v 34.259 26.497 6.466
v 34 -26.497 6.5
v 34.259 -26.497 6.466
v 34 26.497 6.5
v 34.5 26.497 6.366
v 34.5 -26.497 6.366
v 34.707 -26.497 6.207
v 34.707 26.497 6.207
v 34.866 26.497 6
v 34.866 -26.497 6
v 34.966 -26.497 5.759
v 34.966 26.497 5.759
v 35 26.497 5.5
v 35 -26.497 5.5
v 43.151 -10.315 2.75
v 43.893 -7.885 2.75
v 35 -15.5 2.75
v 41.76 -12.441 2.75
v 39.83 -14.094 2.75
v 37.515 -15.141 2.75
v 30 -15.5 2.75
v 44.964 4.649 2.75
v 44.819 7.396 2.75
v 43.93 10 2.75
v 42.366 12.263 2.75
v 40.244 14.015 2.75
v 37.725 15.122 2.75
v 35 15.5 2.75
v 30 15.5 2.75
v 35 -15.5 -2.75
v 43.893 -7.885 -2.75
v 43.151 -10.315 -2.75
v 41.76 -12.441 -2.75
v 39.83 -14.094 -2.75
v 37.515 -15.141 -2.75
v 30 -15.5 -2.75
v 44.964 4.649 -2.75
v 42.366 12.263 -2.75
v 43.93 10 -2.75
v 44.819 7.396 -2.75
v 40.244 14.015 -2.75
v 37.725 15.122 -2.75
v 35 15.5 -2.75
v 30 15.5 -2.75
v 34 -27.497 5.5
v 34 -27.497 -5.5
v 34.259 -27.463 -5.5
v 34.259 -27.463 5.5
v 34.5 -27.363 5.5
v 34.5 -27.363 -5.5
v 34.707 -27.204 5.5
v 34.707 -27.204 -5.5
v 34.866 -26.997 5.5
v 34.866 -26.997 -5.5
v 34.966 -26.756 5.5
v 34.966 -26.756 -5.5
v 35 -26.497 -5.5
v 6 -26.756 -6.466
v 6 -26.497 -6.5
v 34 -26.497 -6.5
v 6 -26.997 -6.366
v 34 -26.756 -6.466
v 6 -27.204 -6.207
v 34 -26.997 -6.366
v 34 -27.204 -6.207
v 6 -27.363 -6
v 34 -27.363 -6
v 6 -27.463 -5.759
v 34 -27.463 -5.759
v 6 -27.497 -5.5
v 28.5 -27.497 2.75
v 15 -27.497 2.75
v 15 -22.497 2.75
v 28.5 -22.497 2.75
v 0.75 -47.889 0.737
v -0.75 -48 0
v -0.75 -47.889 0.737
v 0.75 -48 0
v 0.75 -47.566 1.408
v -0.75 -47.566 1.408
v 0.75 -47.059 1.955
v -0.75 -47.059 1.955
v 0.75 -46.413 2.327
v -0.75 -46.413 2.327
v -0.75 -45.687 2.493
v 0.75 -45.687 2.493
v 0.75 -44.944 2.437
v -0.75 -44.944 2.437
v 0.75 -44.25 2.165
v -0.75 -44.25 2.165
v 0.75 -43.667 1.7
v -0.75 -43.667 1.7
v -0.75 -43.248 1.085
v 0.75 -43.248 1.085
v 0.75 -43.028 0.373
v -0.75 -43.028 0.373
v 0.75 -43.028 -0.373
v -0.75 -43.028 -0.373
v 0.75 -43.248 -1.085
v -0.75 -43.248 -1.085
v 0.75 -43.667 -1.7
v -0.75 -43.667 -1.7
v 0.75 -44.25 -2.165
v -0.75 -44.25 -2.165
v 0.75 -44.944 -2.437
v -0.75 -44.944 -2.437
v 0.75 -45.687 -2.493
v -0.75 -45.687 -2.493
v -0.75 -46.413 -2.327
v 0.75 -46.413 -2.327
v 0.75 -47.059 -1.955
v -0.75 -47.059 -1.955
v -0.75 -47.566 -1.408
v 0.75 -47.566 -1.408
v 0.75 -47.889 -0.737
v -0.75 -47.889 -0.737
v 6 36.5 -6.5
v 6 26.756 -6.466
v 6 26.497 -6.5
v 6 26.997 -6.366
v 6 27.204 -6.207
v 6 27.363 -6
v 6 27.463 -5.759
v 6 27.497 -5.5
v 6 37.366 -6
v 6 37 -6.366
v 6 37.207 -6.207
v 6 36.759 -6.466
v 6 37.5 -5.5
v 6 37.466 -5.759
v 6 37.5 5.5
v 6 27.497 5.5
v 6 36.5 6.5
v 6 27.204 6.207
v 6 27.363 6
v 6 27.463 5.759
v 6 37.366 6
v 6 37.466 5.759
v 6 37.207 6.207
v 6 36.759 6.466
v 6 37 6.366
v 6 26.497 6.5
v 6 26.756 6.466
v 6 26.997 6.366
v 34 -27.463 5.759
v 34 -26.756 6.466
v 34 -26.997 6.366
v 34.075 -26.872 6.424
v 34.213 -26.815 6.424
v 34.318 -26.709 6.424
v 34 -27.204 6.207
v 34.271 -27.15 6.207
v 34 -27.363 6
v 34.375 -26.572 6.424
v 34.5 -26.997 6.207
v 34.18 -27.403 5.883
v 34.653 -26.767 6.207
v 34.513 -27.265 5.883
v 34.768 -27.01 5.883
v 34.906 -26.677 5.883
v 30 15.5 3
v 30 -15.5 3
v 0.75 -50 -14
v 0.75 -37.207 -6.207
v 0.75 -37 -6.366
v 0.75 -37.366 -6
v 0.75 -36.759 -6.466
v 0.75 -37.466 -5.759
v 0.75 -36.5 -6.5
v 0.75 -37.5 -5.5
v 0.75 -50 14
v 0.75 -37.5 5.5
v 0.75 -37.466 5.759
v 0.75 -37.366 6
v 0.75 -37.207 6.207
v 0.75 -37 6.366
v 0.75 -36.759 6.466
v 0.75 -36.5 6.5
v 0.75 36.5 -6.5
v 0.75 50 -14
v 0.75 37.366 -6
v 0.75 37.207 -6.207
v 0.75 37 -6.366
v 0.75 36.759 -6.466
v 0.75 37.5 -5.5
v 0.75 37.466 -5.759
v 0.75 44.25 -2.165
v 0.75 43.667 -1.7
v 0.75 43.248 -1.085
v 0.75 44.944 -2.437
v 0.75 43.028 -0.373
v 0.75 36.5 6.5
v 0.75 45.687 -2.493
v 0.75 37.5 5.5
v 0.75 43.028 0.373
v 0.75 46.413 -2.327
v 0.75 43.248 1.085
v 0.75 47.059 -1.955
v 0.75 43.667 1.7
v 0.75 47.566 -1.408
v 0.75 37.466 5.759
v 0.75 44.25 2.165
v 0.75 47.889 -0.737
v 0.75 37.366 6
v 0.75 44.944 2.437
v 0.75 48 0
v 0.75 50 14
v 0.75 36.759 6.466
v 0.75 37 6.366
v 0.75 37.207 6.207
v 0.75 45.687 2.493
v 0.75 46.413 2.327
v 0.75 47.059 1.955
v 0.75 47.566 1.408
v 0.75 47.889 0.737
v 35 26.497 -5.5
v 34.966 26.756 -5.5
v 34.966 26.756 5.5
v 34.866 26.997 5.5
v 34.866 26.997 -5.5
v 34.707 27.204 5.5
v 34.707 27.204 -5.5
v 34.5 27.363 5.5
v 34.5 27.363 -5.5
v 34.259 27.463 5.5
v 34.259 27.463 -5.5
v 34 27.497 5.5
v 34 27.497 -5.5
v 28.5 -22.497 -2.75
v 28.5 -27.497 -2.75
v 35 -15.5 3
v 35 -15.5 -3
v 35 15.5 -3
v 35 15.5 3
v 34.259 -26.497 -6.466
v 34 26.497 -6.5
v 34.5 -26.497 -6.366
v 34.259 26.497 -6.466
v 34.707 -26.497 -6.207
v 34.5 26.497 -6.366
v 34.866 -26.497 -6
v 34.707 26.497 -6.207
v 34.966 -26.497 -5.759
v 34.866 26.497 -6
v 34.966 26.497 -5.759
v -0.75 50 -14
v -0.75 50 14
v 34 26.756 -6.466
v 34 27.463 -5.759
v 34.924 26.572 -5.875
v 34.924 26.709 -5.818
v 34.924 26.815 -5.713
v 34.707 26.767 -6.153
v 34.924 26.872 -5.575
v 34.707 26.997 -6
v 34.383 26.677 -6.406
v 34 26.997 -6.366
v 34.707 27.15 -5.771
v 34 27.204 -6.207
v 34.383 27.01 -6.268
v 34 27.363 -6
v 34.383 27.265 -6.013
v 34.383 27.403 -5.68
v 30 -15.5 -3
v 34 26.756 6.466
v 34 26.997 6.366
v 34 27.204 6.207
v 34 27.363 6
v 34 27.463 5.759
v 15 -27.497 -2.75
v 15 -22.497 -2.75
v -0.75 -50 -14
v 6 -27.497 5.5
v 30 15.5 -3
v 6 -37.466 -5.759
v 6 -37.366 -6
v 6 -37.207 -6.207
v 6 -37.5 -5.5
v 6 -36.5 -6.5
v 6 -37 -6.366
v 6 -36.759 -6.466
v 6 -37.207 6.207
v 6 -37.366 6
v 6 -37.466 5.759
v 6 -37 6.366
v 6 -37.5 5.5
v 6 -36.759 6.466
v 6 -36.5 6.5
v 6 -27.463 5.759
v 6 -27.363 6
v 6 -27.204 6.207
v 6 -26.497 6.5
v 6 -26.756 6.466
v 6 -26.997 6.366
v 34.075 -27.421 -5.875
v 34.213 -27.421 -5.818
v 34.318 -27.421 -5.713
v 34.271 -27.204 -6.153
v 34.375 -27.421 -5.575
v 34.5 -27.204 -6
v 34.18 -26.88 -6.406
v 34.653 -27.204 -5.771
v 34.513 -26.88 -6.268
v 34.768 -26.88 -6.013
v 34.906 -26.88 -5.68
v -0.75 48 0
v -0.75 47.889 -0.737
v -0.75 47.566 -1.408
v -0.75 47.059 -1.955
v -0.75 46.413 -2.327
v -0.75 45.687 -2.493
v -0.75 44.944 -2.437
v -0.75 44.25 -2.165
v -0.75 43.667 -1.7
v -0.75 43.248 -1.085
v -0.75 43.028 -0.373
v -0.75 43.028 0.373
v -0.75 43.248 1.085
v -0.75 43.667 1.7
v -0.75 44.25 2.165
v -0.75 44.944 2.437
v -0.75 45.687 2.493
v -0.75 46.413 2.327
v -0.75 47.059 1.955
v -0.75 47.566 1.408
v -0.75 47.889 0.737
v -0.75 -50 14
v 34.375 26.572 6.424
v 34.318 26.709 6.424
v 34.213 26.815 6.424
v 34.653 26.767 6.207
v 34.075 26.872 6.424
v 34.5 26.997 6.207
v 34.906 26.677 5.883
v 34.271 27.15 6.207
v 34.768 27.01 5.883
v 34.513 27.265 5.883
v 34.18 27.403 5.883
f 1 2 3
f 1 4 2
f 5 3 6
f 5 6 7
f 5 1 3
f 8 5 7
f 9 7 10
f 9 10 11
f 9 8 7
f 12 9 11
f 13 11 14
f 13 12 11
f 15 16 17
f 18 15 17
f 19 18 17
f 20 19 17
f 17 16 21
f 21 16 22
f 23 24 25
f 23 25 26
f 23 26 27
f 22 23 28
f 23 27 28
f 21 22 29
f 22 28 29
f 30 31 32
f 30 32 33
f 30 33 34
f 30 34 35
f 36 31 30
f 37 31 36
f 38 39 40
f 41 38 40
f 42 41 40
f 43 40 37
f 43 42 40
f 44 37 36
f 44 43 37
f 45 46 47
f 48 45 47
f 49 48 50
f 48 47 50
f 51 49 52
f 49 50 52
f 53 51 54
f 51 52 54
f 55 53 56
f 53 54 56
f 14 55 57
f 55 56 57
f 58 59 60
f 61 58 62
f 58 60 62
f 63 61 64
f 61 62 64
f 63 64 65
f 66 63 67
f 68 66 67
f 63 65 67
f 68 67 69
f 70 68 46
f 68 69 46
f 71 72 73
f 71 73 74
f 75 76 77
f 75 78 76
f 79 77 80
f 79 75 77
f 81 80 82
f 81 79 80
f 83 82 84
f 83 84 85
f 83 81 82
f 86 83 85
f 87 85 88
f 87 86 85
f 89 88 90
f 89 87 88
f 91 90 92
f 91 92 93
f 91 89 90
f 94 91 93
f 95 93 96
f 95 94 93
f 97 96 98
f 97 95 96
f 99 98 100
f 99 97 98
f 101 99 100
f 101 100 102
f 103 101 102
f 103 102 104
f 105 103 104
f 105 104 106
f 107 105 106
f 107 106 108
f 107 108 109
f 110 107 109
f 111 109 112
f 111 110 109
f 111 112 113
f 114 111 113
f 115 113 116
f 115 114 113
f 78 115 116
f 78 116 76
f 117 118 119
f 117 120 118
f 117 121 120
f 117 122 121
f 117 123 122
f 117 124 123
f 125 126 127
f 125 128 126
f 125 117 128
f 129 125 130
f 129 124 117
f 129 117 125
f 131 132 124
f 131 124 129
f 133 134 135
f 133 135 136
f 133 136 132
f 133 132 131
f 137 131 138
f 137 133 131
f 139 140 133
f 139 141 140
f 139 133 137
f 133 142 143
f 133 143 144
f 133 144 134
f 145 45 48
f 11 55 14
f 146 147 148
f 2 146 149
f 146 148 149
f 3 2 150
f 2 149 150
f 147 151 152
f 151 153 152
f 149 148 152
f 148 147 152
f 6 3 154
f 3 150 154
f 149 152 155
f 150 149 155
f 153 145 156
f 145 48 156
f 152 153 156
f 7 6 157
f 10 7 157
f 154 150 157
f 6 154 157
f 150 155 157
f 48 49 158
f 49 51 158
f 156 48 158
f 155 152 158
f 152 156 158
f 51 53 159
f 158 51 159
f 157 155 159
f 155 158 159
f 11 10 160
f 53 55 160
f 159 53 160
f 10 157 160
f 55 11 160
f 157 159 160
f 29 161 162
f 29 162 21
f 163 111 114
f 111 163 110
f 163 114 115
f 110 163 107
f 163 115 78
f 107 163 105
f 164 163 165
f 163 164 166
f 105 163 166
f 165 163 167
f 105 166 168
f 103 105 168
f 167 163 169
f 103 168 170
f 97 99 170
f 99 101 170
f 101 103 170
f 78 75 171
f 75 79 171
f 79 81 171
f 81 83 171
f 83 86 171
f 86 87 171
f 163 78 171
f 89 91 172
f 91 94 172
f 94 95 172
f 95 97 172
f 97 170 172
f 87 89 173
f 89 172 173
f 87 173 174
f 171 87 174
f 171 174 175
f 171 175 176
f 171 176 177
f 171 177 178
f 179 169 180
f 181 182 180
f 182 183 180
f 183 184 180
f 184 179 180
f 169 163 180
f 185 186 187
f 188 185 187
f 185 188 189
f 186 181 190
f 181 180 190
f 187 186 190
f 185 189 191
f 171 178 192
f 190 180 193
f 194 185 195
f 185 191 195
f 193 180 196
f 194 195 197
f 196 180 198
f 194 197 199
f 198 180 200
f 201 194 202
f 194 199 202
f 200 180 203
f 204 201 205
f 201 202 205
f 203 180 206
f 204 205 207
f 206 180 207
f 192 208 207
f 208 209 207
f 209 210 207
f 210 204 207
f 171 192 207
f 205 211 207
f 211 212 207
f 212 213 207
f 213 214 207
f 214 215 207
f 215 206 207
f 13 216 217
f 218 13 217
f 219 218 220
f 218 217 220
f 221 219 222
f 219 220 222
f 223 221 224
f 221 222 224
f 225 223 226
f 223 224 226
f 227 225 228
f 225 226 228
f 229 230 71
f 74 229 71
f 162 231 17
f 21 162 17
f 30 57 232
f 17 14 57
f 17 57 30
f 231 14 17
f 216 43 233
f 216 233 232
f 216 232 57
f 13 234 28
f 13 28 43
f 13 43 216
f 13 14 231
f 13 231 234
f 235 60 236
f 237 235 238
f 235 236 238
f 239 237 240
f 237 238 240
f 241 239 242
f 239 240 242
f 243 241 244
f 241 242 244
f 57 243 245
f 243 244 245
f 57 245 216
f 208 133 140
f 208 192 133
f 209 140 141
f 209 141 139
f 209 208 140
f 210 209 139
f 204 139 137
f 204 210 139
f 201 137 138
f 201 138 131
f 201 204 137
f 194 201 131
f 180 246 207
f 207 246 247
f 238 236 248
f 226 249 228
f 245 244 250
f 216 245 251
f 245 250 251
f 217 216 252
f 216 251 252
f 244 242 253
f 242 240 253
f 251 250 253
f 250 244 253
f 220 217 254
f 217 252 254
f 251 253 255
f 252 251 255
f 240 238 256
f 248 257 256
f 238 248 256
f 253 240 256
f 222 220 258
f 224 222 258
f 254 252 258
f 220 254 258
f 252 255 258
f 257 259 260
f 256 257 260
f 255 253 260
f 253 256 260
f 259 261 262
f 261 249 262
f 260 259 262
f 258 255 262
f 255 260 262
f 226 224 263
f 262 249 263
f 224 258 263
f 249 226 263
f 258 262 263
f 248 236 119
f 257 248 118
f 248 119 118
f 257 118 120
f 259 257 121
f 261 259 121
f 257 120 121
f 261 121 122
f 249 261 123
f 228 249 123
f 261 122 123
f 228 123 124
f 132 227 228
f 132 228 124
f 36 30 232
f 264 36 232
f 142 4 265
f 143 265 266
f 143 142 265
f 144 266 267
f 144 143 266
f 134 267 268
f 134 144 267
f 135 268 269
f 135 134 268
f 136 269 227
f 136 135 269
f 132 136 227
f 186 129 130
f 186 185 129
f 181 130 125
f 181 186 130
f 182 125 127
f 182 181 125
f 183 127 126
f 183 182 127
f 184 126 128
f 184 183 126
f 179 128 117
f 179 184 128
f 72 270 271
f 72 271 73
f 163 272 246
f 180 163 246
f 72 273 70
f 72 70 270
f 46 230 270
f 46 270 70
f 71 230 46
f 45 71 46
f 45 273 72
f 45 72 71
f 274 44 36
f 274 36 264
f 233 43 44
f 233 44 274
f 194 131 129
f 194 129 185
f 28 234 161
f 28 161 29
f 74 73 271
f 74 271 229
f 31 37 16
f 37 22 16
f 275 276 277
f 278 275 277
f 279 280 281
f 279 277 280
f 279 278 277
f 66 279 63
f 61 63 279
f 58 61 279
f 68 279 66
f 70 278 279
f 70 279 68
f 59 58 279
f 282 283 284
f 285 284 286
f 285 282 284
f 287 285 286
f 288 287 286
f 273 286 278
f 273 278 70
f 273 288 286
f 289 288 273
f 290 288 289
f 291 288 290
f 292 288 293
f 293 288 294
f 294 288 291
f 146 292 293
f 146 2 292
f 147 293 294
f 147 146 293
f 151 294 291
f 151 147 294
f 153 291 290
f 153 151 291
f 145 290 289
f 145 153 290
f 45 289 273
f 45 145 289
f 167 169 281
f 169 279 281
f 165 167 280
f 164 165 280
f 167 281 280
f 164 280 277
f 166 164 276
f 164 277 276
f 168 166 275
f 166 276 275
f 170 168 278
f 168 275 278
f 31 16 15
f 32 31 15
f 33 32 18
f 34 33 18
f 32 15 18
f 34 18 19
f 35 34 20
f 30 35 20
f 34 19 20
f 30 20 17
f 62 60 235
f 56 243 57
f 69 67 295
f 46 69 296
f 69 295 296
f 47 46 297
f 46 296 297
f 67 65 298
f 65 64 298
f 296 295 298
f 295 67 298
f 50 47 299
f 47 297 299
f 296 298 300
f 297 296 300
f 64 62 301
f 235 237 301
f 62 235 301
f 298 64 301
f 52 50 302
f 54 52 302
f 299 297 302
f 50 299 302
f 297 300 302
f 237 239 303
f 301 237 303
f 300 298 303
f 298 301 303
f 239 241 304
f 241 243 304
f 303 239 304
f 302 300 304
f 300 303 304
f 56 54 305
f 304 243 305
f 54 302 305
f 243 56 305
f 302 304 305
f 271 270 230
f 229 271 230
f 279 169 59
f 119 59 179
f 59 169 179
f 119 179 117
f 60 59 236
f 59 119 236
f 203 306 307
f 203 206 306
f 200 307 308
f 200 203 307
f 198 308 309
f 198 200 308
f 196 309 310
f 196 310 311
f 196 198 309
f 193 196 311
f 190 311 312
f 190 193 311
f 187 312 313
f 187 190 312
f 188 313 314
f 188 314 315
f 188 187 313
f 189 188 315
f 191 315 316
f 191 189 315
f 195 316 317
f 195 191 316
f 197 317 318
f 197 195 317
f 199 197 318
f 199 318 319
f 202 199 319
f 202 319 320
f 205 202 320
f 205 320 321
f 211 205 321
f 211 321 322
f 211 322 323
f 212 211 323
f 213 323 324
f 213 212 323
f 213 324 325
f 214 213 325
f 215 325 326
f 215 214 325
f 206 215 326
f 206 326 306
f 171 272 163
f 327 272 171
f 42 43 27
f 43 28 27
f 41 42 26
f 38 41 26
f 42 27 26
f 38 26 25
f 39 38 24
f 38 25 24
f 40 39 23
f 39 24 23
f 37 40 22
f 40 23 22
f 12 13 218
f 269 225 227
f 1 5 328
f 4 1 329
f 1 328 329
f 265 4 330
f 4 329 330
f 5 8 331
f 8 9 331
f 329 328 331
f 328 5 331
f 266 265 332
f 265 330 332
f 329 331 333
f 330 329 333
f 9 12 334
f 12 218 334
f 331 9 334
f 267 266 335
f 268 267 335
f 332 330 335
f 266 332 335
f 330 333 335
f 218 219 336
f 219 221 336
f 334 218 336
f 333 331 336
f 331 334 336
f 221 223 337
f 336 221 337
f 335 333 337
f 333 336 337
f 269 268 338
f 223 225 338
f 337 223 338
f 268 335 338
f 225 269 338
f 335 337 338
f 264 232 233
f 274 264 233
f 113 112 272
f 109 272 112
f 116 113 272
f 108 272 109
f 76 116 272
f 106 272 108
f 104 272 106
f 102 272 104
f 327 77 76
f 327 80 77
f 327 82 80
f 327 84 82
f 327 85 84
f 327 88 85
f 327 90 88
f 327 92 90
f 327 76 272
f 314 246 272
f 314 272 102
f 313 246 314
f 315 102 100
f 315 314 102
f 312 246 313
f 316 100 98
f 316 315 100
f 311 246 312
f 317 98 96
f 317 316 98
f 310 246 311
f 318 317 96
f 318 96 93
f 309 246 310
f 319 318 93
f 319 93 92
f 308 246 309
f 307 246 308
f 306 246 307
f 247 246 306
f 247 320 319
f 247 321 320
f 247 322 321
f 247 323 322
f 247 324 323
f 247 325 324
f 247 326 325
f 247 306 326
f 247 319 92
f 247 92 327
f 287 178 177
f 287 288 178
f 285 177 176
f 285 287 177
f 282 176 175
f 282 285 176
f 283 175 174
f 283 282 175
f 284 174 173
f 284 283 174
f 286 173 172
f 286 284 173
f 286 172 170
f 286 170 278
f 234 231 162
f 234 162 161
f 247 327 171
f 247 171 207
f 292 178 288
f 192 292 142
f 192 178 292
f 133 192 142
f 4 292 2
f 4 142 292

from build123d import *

# Parameters (mm, degrees)
EXTRUDE_1_DEPTH     = 6.5
SKETCH_2_W          = 28
SKETCH_2_H          = 100
SKETCH_2_R          = 2.5
EXTRUDE_2_DEPTH     = 0.75
SKETCH_3_W          = 6
SKETCH_3_H          = 31
CUT_EXTRUDE_1_DEPTH = 5
SKETCH_4_W          = 13.5
SKETCH_4_H          = 5.5
CUT_EXTRUDE_2_DEPTH = 5
EXTRUDE_3_DEPTH     = 2.75
FILLET_1_R          = 1
FILLET_2_R          = 1


with BuildPart() as part:
    # 草图1 → 凸台-拉伸1 (new, symmetric)
    with BuildSketch(Plane.XY):
        Polygon((0, 1.01114255), (0, 0), (35, 0), (35, 27.496864511), (6, 27.496864511), (6, 37.5), (0, 37.5), align=None)
        Polygon((35, 0), (0, 0), (0, -1.01114255), (0, -37.5), (6, -37.5), (6, -27.496864511), (35, -27.496864511), align=None)
    extrude(amount=EXTRUDE_1_DEPTH, both=True)

    # 草图2 → 凸台-拉伸2 (add, symmetric)
    with BuildSketch(Plane.ZY):
        Rectangle(SKETCH_2_W, SKETCH_2_H)
        with Locations(Location((0, -45.5, 0), (0, 0, 270))):
            Circle(SKETCH_2_R, mode=Mode.SUBTRACT)
        with Locations(Location((0, 45.5, 0), (0, 0, 90))):
            Circle(SKETCH_2_R, mode=Mode.SUBTRACT)
    extrude(amount=EXTRUDE_2_DEPTH, both=True)

    # 草图3 → 切除-拉伸1 (cut)
    with BuildSketch(Plane(origin=(35, 0, 0), x_dir=(0, 0, -1), z_dir=(1, 0, 0))):
        Rectangle(SKETCH_3_W, SKETCH_3_H)
    extrude(amount=-CUT_EXTRUDE_1_DEPTH, mode=Mode.SUBTRACT)

    # 草图4 → 切除-拉伸2 (cut)
    with BuildSketch(Plane.XZ.offset(27.496864511)):
        with Locations((21.75, 0)):
            Rectangle(SKETCH_4_W, SKETCH_4_H)
    extrude(amount=-CUT_EXTRUDE_2_DEPTH, mode=Mode.SUBTRACT)

    # 草图5 → 凸台-拉伸3 (add, symmetric)
    with BuildSketch(Plane.XY):
        with BuildLine():
            Line((30, -15.5), (30, 15.5))
            Line((30, 15.5), (35, 15.5))
            ThreePointArc((35, 15.5), (42.36590029, 12.263395074), (44.963698746, 4.648702584))
            Line((44.963698746, 4.648702584), (43.892853324, -7.884615385))
            ThreePointArc((43.892853324, -7.884615385), (40.85399272, -13.335990728), (35, -15.5))
            Line((35, -15.5), (30, -15.5))
        make_face()
    extrude(amount=EXTRUDE_3_DEPTH, both=True)

    # 圆角1
    fillet_1_edges = [part.edges().sort_by_distance(p)[0] for p in [
        (3.375, -37.5, 6.5),
        (3.375, -37.5, -6.5),
        (3.375, 37.5, 6.5),
        (3.375, 37.5, -6.5),
    ]]
    fillet(fillet_1_edges, radius=FILLET_1_R)

    # 圆角2
    fillet_2_edges = [part.edges().sort_by_distance(p)[0] for p in [
        (20.5, 27.496864511, -6.5),
        (35, 0, -6.5),
        (20.5, -27.496864511, -6.5),
        (35, 27.496864511, 0),
        (35, -27.496864511, 0),
        (20.5, -27.496864511, 6.5),
        (35, 0, 6.5),
        (20.5, 27.496864511, 6.5),
    ]]
    fillet(fillet_2_edges, radius=FILLET_2_R)


solid = part.part
